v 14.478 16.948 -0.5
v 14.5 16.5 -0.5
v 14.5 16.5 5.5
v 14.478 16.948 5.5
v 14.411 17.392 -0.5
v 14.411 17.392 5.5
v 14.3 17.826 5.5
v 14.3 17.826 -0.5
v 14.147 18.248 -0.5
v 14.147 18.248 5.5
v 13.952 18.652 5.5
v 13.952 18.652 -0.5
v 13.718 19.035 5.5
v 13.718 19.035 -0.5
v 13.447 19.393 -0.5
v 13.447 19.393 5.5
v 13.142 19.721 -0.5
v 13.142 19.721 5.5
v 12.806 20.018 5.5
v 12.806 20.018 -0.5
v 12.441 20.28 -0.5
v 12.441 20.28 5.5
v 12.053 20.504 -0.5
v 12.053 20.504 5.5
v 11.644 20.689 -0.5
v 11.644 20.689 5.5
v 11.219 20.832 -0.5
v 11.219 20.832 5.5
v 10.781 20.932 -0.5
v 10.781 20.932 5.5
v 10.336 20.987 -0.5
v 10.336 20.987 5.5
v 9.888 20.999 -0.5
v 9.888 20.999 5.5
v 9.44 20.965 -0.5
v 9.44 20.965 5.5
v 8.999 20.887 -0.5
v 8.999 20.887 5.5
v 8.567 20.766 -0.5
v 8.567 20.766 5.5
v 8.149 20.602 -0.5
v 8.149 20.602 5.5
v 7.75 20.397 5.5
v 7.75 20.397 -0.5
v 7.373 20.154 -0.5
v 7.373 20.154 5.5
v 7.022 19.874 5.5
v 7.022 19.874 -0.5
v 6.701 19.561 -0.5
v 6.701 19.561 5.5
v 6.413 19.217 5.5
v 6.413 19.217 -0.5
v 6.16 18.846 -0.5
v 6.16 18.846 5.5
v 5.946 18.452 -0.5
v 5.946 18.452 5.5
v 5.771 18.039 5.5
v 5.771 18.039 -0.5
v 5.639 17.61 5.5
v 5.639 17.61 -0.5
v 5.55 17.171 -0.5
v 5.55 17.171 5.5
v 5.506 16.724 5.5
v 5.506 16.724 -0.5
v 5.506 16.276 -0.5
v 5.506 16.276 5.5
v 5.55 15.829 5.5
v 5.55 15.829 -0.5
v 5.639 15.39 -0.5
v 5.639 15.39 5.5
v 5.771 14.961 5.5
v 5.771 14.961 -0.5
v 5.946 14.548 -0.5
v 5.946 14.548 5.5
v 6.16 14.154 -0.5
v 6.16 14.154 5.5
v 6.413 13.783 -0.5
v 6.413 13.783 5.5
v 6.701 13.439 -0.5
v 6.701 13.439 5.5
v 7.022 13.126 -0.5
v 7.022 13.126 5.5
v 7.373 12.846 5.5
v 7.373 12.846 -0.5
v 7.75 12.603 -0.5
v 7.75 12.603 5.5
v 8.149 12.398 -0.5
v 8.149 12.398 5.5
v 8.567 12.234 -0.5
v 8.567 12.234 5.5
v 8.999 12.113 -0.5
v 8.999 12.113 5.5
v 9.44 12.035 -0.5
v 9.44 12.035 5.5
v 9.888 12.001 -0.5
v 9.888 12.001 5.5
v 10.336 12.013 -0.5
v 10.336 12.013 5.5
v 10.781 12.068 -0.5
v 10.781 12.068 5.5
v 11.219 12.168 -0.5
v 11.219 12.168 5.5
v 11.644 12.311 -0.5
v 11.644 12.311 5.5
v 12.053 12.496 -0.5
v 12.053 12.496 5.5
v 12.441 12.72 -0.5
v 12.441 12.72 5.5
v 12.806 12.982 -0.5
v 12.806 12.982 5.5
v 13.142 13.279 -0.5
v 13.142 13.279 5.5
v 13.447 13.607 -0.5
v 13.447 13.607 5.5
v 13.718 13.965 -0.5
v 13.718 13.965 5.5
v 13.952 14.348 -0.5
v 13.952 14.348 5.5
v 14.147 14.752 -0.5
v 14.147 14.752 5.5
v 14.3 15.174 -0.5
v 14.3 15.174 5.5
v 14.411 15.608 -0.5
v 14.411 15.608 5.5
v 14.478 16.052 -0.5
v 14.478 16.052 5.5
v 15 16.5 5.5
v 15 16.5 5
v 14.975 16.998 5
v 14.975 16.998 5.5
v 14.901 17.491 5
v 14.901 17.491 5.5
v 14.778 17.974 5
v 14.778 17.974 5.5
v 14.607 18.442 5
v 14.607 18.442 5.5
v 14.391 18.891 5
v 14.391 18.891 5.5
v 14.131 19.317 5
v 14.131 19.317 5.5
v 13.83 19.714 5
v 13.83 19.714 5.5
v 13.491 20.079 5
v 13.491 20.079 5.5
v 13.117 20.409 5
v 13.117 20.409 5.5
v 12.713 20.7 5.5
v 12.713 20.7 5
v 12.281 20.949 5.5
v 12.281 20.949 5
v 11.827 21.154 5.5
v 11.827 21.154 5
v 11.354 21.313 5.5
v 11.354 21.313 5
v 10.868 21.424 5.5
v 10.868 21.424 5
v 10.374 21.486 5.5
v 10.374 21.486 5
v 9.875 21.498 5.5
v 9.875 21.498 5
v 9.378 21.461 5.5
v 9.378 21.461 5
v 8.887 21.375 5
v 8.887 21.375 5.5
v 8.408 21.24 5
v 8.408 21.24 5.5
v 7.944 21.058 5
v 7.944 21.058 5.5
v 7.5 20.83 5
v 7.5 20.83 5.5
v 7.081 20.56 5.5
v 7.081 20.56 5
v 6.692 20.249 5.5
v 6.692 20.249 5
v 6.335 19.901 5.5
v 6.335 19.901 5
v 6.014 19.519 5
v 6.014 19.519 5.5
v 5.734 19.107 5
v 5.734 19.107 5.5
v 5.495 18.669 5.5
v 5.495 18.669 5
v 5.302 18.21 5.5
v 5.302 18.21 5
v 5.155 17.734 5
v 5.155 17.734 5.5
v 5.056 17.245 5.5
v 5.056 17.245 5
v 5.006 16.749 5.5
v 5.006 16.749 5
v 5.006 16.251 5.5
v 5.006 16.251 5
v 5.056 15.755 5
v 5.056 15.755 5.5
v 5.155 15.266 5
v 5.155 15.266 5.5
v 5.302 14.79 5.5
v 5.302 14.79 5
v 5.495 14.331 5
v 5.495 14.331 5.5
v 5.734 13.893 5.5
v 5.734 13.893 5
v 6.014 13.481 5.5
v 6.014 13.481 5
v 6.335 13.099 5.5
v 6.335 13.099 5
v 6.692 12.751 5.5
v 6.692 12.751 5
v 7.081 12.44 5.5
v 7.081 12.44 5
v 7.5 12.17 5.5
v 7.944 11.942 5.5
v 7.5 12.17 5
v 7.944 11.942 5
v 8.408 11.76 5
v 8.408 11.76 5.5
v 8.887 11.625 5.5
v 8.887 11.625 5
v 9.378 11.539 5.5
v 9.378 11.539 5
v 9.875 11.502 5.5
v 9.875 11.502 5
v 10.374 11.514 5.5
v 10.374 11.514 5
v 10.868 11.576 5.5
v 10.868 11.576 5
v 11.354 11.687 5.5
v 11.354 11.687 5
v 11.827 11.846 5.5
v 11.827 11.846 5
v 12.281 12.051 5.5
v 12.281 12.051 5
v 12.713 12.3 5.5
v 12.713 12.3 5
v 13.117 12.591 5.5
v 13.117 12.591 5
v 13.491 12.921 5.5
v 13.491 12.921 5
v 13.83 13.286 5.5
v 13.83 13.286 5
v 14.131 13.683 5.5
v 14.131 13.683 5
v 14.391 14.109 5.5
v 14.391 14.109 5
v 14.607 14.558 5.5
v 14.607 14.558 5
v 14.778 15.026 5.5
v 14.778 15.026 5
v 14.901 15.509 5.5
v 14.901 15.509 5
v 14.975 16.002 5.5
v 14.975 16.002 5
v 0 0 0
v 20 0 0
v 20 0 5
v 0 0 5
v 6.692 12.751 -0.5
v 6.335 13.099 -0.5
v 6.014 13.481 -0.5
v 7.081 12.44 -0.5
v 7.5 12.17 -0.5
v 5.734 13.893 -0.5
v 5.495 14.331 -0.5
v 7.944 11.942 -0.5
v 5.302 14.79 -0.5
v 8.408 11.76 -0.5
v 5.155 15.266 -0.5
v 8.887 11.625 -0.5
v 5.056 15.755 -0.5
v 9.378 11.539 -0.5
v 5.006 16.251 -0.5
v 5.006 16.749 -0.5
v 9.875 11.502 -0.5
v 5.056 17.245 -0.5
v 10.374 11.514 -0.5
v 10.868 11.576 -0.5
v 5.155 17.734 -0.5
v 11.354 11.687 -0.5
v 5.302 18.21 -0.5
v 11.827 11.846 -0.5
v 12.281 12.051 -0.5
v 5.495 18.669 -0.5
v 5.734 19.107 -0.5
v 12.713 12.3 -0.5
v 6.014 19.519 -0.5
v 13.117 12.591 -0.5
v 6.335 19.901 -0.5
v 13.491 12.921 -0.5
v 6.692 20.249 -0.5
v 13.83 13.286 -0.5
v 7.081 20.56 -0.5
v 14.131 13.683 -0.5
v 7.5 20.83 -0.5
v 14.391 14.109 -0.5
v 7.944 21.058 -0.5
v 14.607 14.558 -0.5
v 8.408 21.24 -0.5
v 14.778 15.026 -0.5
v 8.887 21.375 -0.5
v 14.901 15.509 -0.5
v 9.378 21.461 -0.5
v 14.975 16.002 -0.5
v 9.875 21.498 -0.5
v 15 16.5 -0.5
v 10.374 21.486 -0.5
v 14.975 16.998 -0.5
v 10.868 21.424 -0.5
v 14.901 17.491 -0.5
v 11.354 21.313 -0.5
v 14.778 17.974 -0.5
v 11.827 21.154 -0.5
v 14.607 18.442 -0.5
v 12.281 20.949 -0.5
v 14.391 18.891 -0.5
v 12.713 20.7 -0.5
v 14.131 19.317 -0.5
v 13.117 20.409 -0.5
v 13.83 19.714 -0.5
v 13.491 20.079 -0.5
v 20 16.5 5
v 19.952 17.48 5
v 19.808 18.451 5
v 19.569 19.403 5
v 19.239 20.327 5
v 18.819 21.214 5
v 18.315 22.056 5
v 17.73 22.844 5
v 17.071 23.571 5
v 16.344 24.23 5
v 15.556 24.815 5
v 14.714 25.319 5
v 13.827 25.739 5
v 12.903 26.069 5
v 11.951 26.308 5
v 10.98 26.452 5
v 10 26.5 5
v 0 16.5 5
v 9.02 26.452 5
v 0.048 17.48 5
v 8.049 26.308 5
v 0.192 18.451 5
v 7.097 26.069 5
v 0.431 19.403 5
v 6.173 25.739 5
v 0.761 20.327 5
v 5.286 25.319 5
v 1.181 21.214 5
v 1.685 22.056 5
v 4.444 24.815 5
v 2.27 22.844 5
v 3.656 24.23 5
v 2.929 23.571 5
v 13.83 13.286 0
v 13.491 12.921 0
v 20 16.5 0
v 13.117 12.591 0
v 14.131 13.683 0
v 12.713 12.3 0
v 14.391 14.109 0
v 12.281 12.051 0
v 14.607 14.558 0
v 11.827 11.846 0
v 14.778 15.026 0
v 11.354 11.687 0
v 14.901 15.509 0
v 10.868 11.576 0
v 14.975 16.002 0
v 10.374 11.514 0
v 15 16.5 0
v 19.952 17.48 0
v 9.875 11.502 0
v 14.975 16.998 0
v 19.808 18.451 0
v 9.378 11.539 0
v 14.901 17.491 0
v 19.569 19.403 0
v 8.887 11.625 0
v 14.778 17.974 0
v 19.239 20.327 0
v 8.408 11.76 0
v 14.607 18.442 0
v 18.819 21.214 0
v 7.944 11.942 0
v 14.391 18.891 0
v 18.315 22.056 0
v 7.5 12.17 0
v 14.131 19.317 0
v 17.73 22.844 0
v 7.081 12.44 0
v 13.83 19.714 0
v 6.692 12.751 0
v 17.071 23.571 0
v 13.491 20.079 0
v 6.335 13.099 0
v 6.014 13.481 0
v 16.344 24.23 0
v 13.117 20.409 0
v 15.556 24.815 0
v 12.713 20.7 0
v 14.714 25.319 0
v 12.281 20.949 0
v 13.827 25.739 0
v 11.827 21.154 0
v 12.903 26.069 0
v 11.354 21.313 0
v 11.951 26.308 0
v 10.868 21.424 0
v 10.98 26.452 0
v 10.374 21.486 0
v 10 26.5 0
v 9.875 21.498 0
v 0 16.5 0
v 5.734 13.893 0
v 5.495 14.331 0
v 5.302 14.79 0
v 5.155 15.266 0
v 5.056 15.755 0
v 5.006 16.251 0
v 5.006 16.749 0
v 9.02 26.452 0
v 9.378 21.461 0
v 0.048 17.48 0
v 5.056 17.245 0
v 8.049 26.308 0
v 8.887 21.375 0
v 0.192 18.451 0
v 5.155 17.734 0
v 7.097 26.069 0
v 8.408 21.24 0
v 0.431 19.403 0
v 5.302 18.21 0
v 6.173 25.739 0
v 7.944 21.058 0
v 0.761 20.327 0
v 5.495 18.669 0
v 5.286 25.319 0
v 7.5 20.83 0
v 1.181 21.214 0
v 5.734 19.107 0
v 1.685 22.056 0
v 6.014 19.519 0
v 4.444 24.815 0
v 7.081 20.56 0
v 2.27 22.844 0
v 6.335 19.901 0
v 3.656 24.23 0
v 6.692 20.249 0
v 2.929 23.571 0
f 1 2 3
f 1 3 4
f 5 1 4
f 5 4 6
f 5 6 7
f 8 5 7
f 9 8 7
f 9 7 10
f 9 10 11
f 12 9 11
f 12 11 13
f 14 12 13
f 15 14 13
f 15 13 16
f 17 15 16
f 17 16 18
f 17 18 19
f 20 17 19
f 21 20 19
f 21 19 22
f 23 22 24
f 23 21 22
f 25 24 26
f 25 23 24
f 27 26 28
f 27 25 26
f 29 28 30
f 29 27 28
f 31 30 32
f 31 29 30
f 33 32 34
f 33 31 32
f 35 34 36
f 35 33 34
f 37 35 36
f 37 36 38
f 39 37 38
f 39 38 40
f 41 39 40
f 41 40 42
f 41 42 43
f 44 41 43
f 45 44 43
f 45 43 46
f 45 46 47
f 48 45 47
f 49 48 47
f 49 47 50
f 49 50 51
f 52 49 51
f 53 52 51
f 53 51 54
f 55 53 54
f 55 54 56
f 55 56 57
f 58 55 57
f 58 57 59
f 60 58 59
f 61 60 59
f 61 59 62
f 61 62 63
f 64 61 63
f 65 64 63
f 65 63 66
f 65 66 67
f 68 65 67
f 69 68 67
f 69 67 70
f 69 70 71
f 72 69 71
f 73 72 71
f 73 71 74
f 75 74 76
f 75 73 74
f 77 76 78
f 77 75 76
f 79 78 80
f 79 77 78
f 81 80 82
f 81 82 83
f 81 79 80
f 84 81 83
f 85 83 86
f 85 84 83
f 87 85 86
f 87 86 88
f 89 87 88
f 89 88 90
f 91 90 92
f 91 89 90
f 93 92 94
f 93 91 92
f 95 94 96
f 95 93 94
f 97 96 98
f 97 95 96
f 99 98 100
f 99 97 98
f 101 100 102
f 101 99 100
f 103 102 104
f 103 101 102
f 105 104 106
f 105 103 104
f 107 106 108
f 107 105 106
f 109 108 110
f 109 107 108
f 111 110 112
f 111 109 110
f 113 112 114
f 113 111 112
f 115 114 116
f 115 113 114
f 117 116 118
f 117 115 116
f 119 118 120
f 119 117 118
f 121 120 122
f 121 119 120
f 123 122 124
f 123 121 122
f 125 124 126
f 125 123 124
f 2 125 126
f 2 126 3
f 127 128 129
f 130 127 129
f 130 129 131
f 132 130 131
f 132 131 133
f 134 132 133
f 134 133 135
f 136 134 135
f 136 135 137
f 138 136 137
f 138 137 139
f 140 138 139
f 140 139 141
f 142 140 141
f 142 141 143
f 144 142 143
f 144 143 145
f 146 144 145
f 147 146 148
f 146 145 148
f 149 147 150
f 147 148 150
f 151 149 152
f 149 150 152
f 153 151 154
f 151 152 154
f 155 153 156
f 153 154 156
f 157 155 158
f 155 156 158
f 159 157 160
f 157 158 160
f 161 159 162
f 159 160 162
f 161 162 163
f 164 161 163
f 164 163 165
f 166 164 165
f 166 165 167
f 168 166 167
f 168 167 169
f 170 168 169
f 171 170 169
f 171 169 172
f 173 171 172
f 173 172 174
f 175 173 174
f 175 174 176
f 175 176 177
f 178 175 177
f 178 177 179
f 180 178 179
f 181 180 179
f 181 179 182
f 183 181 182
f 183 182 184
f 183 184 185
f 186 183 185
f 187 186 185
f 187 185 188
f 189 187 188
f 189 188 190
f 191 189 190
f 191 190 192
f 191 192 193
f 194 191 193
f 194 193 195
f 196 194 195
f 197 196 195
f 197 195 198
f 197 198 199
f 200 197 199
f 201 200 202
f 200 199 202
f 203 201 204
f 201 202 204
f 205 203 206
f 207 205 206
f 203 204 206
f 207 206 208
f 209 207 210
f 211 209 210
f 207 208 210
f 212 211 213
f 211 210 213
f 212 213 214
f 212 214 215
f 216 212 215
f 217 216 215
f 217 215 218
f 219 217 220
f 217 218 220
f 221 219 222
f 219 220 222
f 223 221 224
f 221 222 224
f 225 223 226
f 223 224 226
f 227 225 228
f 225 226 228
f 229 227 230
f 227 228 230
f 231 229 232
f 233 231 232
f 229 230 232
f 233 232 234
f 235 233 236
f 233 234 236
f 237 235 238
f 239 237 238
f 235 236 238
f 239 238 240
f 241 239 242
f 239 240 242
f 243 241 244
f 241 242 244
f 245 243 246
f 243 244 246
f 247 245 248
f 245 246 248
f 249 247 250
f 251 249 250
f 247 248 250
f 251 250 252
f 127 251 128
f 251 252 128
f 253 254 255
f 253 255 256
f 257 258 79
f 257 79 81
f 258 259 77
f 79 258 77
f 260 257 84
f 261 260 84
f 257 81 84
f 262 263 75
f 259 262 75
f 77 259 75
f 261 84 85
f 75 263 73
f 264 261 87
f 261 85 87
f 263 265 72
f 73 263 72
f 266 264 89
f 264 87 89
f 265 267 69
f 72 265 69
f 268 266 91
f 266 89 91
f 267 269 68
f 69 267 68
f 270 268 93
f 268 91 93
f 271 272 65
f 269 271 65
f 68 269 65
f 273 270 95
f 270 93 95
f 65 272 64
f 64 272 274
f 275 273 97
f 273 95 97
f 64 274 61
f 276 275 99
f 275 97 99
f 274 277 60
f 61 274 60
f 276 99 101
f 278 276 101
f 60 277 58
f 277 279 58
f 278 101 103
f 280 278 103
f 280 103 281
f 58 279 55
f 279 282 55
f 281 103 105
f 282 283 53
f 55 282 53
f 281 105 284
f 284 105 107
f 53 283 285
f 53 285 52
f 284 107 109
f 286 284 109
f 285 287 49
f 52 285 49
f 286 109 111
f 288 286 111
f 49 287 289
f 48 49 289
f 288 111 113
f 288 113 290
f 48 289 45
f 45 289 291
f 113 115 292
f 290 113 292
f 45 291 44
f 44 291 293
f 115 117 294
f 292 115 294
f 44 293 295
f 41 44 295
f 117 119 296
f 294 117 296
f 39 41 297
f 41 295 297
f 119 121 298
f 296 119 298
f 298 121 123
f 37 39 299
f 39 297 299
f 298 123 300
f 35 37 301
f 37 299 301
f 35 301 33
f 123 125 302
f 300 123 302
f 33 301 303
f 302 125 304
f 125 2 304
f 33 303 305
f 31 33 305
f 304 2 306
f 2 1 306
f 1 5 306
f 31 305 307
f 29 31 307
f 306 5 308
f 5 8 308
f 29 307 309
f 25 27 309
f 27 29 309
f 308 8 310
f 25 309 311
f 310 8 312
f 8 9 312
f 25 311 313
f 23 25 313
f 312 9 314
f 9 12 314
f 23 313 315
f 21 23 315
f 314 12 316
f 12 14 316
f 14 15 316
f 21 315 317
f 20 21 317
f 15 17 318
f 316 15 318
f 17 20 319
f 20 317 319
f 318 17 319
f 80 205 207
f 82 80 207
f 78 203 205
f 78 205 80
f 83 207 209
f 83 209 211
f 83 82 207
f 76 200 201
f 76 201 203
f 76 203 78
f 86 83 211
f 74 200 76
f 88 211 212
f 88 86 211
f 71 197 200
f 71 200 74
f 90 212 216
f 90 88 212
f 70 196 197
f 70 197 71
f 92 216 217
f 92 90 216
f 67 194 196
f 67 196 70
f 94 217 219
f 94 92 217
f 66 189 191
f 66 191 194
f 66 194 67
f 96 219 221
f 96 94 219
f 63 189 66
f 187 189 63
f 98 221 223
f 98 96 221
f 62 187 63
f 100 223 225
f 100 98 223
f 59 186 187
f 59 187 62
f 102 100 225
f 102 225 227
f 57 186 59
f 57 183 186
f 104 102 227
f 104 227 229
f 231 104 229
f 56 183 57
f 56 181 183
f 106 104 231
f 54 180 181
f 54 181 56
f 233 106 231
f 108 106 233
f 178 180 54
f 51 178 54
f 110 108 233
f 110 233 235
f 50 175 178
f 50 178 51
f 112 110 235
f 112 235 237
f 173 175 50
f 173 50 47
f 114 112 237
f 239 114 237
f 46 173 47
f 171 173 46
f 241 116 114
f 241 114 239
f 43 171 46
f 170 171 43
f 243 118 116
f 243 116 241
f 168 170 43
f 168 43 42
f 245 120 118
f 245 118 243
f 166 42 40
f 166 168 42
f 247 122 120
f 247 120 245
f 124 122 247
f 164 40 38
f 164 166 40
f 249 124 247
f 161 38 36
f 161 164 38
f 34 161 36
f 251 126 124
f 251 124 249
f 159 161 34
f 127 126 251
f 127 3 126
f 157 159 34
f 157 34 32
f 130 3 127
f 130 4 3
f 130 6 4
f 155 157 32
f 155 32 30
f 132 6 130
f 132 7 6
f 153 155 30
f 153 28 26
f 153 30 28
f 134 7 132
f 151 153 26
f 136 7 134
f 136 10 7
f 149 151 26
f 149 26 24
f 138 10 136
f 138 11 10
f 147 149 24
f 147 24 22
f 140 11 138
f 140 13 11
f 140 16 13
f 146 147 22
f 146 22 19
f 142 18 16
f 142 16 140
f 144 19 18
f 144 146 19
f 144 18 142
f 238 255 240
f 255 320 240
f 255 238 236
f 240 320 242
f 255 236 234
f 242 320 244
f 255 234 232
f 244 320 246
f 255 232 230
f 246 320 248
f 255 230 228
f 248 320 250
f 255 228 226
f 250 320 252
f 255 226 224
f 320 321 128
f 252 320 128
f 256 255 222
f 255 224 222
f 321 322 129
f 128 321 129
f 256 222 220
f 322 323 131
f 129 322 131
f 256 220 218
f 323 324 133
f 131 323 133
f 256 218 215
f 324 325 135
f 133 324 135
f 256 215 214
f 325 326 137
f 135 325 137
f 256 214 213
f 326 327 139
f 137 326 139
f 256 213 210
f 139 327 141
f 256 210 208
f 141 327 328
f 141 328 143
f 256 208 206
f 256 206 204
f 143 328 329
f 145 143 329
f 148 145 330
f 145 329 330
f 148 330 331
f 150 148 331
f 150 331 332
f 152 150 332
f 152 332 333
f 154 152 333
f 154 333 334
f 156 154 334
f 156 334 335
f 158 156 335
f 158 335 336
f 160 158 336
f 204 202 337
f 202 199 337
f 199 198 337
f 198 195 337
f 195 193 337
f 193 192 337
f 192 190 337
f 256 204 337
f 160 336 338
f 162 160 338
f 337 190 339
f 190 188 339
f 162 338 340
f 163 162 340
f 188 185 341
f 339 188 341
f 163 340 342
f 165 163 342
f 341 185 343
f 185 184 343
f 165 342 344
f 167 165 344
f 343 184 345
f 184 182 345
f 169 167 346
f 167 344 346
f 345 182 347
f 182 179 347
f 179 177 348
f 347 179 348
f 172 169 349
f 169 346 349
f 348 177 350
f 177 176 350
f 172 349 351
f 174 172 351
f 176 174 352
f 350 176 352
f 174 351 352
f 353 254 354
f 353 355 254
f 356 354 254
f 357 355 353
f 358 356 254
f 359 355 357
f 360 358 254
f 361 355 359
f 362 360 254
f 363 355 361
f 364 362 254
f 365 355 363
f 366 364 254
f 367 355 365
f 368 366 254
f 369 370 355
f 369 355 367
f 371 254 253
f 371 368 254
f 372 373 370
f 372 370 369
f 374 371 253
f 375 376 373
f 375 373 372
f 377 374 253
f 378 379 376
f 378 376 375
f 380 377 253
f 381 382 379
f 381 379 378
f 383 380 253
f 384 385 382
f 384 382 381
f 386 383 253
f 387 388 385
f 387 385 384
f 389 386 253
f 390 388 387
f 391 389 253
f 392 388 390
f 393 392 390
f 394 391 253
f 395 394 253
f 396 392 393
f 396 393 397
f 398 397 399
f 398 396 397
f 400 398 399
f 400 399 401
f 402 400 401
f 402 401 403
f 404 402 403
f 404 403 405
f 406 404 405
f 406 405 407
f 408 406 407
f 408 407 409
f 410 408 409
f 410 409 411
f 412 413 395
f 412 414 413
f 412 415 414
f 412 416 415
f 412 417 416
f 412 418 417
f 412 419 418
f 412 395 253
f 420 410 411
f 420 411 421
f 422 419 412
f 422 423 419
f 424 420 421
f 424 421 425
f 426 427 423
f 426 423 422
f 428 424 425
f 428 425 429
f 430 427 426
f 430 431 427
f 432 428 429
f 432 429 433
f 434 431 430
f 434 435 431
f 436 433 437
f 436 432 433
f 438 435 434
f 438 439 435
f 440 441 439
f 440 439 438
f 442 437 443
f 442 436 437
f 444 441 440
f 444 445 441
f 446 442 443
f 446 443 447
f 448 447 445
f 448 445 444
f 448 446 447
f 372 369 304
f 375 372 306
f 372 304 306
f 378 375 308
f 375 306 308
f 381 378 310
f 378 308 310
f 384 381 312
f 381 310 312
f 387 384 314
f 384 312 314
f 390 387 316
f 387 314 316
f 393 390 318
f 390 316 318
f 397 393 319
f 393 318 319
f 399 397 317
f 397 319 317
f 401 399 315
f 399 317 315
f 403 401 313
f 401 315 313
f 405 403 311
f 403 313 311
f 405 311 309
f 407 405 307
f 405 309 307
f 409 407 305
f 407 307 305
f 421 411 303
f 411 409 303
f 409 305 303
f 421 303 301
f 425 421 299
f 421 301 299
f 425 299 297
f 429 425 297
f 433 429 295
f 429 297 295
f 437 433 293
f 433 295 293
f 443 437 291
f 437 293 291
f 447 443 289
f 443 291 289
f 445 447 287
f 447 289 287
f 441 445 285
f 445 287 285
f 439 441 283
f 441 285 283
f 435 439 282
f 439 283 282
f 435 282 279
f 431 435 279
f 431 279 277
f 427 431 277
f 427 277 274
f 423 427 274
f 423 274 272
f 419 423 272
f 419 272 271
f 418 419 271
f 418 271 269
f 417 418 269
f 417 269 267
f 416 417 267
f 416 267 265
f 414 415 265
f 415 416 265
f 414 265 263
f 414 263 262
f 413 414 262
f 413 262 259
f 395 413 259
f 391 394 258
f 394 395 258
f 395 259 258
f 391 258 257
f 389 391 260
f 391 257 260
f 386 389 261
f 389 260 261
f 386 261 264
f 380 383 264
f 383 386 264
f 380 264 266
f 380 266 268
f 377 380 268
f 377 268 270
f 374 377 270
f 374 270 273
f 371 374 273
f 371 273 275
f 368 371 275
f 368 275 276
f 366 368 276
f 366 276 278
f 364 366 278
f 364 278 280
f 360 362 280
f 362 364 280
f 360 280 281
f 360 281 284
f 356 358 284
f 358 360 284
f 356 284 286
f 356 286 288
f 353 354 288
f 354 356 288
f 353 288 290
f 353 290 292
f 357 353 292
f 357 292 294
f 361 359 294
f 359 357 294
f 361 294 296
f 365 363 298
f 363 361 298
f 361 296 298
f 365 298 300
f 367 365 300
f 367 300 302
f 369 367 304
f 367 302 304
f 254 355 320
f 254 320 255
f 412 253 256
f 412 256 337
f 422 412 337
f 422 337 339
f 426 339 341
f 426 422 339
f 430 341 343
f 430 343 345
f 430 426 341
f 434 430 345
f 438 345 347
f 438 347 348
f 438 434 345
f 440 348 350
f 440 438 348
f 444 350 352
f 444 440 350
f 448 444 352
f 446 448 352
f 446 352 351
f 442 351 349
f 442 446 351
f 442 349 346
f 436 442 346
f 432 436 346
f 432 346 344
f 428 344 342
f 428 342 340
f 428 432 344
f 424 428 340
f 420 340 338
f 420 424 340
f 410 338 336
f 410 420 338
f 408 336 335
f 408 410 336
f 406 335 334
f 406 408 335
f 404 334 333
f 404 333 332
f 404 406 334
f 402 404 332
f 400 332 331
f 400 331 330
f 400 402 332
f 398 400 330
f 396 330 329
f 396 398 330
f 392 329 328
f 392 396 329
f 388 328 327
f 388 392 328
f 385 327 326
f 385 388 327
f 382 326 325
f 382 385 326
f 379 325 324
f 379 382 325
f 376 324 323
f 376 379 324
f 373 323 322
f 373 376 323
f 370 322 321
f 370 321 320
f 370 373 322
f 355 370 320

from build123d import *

# Parameters (mm, degrees)
CROQUIS1_R                   = 4.5
SALIENTE_EXTRUIR1_DEPTH      = 5
SALIENTE_EXTRUIR3_DEPTH      = 3
SALIENTE_EXTRUIR3_DEPTH_BACK = 3
CROQUIS2_R                   = 5
CROQUIS2_R_2                 = 4.5


with BuildPart() as part:
    # Croquis1 → Saliente-Extruir1 (new body)
    with BuildSketch(Plane.XY):
        with BuildLine():
            Line((0, 0), (0, 16.5))
            ThreePointArc((0, 16.5), (10, 26.5), (20, 16.5))
            Line((20, 16.5), (20, 0))
            Line((20, 0), (0, 0))
        make_face()
        with Locations((10, 16.5)):
            Circle(CROQUIS1_R, mode=Mode.SUBTRACT)
    extrude(amount=SALIENTE_EXTRUIR1_DEPTH)

    # Croquis2 → Saliente-Extruir3 (add, two sides: drawn at the far end of the back side and taken through both)
    with BuildSketch(Plane.XY.offset(2.5).offset(-SALIENTE_EXTRUIR3_DEPTH_BACK)):
        with Locations((10, 16.5)):
            Circle(CROQUIS2_R)
        with Locations((10, 16.5)):
            Circle(CROQUIS2_R_2, mode=Mode.SUBTRACT)
    extrude(amount=SALIENTE_EXTRUIR3_DEPTH + SALIENTE_EXTRUIR3_DEPTH_BACK)


solid = part.part
